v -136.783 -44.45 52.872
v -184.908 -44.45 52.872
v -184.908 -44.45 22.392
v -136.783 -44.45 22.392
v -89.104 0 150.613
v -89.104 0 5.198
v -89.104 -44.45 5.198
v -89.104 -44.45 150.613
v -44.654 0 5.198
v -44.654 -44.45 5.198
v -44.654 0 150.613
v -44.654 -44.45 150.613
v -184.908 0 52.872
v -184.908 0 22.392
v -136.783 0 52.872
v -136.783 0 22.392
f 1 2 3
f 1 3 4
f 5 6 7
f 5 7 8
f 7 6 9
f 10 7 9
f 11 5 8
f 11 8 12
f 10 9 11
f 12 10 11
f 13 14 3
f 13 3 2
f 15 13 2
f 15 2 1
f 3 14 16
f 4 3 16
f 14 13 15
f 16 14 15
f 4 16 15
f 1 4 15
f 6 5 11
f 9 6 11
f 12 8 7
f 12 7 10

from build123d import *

# Parameters (mm, degrees)
F0_W     = 44.45
F0_H     = 145.415
F1_W     = 48.12479
F1_H     = 30.48
F2_DEPTH = 44.45


with BuildPart() as f2:
    # F0 (on Front) + F1 (on face) → F2 (new body)
    with BuildSketch(Plane.XZ):
        with Locations((-66.879058, 77.905476)):
            Rectangle(F0_W, F0_H)
    with BuildSketch(Plane.XZ):
        with Locations((-160.845518, 37.631606)):
            Rectangle(F1_W, F1_H)
    extrude(amount=F2_DEPTH)


solid = f2.part
